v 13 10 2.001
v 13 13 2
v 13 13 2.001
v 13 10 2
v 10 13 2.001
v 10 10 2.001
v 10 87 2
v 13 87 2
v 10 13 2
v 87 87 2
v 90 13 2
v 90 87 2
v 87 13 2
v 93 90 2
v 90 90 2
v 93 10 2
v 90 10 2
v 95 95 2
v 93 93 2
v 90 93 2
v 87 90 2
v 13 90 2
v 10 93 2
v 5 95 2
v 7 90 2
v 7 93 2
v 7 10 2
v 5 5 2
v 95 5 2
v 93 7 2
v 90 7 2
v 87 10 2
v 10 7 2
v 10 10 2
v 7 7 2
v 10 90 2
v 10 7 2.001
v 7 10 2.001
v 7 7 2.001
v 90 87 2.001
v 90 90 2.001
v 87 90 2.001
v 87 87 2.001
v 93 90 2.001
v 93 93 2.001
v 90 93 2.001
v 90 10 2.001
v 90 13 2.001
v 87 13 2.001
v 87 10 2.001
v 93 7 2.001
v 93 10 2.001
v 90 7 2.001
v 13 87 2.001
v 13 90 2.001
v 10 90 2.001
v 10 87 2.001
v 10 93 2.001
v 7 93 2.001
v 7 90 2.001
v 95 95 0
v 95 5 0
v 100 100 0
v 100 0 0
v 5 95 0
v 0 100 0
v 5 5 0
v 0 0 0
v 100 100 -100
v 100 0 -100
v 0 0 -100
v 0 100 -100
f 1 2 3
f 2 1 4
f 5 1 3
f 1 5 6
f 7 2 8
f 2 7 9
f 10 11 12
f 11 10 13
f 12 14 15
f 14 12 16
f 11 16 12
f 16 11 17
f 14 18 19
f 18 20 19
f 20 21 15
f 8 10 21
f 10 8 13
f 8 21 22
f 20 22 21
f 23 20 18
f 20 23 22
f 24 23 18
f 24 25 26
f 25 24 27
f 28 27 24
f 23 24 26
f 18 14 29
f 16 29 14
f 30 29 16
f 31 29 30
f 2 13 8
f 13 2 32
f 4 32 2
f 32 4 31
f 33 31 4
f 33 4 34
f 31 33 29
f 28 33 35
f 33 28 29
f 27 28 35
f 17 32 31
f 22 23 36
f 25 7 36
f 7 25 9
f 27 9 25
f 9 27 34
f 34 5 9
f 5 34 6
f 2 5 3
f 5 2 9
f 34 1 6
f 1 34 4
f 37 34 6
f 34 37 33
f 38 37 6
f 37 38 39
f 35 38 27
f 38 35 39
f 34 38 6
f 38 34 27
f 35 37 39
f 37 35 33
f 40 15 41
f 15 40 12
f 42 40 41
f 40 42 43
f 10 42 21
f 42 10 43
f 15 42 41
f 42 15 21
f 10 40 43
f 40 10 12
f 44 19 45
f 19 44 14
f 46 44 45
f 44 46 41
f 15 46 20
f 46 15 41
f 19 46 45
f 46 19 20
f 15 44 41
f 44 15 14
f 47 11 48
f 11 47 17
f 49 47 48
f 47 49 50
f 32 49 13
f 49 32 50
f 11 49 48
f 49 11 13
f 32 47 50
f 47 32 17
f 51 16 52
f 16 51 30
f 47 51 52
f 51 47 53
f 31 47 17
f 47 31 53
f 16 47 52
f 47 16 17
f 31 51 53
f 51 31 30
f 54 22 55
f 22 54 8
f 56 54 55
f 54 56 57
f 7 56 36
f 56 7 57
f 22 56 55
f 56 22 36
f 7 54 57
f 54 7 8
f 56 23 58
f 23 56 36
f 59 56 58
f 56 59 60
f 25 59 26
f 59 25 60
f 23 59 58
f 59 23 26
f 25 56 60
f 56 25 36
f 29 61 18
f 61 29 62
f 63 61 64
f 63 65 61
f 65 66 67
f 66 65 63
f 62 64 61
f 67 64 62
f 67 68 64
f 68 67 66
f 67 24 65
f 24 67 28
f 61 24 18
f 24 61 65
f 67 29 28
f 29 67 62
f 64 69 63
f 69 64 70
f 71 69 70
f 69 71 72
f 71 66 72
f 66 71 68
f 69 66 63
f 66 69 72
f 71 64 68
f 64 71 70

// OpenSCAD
d1=22;
d2=10;
u=30;
v=50;
c1=[0,0,0];
c2=[1,1,1];
l_table=100;
l_mire=80;
mire=1;
taille_coin=3;

if (mire==0){
    translate([u,v,0]){
        color(c1,1){
            difference(){
                cylinder(2,r=d1/2,$fn=360);
                translate([0,0,-1]) cylinder(4,r=d2/2,$fn=360);
            }
        };
        color(c2,1) cylinder(2,r=d2/2,$fn=360);
    }
}

if (mire==1){
    color("white") translate([(l_table-l_mire)/2-taille_coin-2,(l_table-l_mire)/2-taille_coin-2,0]) cube([l_mire+2*taille_coin+4,l_mire+2*taille_coin+4,2]);
    color("black") {
        translate([(l_table-l_mire)/2,(l_table-l_mire)/2, 2]) {
            cube([taille_coin, taille_coin, 0.001]);
            translate([-taille_coin,-taille_coin,0]) cube([taille_coin, taille_coin, 0.001]);
        }

        translate([l_table-taille_coin-(l_table-l_mire)/2,l_table-taille_coin-(l_table-l_mire)/2, 2]) {
            cube([taille_coin, taille_coin, 0.001]);
            translate([taille_coin,taille_coin,0]) cube([taille_coin, taille_coin, 0.001]);
        }
        
        translate([l_table-taille_coin-(l_table-l_mire)/2,(l_table-l_mire)/2, 2]) {
            cube([taille_coin, taille_coin, 0.001]);
            translate([taille_coin,-taille_coin,0]) cube([taille_coin, taille_coin, 0.001]);
        }

        translate([(l_table-l_mire)/2,l_table-taille_coin-(l_table-l_mire)/2, 2]) {
            cube([taille_coin, taille_coin, 0.001]);
            translate([-taille_coin,taille_coin,0]) cube([taille_coin, taille_coin, 0.001]);
        }
    }
    
}


color([74/255,67/255,75/255],1) translate([0,0,-l_table]) cube(l_table);
